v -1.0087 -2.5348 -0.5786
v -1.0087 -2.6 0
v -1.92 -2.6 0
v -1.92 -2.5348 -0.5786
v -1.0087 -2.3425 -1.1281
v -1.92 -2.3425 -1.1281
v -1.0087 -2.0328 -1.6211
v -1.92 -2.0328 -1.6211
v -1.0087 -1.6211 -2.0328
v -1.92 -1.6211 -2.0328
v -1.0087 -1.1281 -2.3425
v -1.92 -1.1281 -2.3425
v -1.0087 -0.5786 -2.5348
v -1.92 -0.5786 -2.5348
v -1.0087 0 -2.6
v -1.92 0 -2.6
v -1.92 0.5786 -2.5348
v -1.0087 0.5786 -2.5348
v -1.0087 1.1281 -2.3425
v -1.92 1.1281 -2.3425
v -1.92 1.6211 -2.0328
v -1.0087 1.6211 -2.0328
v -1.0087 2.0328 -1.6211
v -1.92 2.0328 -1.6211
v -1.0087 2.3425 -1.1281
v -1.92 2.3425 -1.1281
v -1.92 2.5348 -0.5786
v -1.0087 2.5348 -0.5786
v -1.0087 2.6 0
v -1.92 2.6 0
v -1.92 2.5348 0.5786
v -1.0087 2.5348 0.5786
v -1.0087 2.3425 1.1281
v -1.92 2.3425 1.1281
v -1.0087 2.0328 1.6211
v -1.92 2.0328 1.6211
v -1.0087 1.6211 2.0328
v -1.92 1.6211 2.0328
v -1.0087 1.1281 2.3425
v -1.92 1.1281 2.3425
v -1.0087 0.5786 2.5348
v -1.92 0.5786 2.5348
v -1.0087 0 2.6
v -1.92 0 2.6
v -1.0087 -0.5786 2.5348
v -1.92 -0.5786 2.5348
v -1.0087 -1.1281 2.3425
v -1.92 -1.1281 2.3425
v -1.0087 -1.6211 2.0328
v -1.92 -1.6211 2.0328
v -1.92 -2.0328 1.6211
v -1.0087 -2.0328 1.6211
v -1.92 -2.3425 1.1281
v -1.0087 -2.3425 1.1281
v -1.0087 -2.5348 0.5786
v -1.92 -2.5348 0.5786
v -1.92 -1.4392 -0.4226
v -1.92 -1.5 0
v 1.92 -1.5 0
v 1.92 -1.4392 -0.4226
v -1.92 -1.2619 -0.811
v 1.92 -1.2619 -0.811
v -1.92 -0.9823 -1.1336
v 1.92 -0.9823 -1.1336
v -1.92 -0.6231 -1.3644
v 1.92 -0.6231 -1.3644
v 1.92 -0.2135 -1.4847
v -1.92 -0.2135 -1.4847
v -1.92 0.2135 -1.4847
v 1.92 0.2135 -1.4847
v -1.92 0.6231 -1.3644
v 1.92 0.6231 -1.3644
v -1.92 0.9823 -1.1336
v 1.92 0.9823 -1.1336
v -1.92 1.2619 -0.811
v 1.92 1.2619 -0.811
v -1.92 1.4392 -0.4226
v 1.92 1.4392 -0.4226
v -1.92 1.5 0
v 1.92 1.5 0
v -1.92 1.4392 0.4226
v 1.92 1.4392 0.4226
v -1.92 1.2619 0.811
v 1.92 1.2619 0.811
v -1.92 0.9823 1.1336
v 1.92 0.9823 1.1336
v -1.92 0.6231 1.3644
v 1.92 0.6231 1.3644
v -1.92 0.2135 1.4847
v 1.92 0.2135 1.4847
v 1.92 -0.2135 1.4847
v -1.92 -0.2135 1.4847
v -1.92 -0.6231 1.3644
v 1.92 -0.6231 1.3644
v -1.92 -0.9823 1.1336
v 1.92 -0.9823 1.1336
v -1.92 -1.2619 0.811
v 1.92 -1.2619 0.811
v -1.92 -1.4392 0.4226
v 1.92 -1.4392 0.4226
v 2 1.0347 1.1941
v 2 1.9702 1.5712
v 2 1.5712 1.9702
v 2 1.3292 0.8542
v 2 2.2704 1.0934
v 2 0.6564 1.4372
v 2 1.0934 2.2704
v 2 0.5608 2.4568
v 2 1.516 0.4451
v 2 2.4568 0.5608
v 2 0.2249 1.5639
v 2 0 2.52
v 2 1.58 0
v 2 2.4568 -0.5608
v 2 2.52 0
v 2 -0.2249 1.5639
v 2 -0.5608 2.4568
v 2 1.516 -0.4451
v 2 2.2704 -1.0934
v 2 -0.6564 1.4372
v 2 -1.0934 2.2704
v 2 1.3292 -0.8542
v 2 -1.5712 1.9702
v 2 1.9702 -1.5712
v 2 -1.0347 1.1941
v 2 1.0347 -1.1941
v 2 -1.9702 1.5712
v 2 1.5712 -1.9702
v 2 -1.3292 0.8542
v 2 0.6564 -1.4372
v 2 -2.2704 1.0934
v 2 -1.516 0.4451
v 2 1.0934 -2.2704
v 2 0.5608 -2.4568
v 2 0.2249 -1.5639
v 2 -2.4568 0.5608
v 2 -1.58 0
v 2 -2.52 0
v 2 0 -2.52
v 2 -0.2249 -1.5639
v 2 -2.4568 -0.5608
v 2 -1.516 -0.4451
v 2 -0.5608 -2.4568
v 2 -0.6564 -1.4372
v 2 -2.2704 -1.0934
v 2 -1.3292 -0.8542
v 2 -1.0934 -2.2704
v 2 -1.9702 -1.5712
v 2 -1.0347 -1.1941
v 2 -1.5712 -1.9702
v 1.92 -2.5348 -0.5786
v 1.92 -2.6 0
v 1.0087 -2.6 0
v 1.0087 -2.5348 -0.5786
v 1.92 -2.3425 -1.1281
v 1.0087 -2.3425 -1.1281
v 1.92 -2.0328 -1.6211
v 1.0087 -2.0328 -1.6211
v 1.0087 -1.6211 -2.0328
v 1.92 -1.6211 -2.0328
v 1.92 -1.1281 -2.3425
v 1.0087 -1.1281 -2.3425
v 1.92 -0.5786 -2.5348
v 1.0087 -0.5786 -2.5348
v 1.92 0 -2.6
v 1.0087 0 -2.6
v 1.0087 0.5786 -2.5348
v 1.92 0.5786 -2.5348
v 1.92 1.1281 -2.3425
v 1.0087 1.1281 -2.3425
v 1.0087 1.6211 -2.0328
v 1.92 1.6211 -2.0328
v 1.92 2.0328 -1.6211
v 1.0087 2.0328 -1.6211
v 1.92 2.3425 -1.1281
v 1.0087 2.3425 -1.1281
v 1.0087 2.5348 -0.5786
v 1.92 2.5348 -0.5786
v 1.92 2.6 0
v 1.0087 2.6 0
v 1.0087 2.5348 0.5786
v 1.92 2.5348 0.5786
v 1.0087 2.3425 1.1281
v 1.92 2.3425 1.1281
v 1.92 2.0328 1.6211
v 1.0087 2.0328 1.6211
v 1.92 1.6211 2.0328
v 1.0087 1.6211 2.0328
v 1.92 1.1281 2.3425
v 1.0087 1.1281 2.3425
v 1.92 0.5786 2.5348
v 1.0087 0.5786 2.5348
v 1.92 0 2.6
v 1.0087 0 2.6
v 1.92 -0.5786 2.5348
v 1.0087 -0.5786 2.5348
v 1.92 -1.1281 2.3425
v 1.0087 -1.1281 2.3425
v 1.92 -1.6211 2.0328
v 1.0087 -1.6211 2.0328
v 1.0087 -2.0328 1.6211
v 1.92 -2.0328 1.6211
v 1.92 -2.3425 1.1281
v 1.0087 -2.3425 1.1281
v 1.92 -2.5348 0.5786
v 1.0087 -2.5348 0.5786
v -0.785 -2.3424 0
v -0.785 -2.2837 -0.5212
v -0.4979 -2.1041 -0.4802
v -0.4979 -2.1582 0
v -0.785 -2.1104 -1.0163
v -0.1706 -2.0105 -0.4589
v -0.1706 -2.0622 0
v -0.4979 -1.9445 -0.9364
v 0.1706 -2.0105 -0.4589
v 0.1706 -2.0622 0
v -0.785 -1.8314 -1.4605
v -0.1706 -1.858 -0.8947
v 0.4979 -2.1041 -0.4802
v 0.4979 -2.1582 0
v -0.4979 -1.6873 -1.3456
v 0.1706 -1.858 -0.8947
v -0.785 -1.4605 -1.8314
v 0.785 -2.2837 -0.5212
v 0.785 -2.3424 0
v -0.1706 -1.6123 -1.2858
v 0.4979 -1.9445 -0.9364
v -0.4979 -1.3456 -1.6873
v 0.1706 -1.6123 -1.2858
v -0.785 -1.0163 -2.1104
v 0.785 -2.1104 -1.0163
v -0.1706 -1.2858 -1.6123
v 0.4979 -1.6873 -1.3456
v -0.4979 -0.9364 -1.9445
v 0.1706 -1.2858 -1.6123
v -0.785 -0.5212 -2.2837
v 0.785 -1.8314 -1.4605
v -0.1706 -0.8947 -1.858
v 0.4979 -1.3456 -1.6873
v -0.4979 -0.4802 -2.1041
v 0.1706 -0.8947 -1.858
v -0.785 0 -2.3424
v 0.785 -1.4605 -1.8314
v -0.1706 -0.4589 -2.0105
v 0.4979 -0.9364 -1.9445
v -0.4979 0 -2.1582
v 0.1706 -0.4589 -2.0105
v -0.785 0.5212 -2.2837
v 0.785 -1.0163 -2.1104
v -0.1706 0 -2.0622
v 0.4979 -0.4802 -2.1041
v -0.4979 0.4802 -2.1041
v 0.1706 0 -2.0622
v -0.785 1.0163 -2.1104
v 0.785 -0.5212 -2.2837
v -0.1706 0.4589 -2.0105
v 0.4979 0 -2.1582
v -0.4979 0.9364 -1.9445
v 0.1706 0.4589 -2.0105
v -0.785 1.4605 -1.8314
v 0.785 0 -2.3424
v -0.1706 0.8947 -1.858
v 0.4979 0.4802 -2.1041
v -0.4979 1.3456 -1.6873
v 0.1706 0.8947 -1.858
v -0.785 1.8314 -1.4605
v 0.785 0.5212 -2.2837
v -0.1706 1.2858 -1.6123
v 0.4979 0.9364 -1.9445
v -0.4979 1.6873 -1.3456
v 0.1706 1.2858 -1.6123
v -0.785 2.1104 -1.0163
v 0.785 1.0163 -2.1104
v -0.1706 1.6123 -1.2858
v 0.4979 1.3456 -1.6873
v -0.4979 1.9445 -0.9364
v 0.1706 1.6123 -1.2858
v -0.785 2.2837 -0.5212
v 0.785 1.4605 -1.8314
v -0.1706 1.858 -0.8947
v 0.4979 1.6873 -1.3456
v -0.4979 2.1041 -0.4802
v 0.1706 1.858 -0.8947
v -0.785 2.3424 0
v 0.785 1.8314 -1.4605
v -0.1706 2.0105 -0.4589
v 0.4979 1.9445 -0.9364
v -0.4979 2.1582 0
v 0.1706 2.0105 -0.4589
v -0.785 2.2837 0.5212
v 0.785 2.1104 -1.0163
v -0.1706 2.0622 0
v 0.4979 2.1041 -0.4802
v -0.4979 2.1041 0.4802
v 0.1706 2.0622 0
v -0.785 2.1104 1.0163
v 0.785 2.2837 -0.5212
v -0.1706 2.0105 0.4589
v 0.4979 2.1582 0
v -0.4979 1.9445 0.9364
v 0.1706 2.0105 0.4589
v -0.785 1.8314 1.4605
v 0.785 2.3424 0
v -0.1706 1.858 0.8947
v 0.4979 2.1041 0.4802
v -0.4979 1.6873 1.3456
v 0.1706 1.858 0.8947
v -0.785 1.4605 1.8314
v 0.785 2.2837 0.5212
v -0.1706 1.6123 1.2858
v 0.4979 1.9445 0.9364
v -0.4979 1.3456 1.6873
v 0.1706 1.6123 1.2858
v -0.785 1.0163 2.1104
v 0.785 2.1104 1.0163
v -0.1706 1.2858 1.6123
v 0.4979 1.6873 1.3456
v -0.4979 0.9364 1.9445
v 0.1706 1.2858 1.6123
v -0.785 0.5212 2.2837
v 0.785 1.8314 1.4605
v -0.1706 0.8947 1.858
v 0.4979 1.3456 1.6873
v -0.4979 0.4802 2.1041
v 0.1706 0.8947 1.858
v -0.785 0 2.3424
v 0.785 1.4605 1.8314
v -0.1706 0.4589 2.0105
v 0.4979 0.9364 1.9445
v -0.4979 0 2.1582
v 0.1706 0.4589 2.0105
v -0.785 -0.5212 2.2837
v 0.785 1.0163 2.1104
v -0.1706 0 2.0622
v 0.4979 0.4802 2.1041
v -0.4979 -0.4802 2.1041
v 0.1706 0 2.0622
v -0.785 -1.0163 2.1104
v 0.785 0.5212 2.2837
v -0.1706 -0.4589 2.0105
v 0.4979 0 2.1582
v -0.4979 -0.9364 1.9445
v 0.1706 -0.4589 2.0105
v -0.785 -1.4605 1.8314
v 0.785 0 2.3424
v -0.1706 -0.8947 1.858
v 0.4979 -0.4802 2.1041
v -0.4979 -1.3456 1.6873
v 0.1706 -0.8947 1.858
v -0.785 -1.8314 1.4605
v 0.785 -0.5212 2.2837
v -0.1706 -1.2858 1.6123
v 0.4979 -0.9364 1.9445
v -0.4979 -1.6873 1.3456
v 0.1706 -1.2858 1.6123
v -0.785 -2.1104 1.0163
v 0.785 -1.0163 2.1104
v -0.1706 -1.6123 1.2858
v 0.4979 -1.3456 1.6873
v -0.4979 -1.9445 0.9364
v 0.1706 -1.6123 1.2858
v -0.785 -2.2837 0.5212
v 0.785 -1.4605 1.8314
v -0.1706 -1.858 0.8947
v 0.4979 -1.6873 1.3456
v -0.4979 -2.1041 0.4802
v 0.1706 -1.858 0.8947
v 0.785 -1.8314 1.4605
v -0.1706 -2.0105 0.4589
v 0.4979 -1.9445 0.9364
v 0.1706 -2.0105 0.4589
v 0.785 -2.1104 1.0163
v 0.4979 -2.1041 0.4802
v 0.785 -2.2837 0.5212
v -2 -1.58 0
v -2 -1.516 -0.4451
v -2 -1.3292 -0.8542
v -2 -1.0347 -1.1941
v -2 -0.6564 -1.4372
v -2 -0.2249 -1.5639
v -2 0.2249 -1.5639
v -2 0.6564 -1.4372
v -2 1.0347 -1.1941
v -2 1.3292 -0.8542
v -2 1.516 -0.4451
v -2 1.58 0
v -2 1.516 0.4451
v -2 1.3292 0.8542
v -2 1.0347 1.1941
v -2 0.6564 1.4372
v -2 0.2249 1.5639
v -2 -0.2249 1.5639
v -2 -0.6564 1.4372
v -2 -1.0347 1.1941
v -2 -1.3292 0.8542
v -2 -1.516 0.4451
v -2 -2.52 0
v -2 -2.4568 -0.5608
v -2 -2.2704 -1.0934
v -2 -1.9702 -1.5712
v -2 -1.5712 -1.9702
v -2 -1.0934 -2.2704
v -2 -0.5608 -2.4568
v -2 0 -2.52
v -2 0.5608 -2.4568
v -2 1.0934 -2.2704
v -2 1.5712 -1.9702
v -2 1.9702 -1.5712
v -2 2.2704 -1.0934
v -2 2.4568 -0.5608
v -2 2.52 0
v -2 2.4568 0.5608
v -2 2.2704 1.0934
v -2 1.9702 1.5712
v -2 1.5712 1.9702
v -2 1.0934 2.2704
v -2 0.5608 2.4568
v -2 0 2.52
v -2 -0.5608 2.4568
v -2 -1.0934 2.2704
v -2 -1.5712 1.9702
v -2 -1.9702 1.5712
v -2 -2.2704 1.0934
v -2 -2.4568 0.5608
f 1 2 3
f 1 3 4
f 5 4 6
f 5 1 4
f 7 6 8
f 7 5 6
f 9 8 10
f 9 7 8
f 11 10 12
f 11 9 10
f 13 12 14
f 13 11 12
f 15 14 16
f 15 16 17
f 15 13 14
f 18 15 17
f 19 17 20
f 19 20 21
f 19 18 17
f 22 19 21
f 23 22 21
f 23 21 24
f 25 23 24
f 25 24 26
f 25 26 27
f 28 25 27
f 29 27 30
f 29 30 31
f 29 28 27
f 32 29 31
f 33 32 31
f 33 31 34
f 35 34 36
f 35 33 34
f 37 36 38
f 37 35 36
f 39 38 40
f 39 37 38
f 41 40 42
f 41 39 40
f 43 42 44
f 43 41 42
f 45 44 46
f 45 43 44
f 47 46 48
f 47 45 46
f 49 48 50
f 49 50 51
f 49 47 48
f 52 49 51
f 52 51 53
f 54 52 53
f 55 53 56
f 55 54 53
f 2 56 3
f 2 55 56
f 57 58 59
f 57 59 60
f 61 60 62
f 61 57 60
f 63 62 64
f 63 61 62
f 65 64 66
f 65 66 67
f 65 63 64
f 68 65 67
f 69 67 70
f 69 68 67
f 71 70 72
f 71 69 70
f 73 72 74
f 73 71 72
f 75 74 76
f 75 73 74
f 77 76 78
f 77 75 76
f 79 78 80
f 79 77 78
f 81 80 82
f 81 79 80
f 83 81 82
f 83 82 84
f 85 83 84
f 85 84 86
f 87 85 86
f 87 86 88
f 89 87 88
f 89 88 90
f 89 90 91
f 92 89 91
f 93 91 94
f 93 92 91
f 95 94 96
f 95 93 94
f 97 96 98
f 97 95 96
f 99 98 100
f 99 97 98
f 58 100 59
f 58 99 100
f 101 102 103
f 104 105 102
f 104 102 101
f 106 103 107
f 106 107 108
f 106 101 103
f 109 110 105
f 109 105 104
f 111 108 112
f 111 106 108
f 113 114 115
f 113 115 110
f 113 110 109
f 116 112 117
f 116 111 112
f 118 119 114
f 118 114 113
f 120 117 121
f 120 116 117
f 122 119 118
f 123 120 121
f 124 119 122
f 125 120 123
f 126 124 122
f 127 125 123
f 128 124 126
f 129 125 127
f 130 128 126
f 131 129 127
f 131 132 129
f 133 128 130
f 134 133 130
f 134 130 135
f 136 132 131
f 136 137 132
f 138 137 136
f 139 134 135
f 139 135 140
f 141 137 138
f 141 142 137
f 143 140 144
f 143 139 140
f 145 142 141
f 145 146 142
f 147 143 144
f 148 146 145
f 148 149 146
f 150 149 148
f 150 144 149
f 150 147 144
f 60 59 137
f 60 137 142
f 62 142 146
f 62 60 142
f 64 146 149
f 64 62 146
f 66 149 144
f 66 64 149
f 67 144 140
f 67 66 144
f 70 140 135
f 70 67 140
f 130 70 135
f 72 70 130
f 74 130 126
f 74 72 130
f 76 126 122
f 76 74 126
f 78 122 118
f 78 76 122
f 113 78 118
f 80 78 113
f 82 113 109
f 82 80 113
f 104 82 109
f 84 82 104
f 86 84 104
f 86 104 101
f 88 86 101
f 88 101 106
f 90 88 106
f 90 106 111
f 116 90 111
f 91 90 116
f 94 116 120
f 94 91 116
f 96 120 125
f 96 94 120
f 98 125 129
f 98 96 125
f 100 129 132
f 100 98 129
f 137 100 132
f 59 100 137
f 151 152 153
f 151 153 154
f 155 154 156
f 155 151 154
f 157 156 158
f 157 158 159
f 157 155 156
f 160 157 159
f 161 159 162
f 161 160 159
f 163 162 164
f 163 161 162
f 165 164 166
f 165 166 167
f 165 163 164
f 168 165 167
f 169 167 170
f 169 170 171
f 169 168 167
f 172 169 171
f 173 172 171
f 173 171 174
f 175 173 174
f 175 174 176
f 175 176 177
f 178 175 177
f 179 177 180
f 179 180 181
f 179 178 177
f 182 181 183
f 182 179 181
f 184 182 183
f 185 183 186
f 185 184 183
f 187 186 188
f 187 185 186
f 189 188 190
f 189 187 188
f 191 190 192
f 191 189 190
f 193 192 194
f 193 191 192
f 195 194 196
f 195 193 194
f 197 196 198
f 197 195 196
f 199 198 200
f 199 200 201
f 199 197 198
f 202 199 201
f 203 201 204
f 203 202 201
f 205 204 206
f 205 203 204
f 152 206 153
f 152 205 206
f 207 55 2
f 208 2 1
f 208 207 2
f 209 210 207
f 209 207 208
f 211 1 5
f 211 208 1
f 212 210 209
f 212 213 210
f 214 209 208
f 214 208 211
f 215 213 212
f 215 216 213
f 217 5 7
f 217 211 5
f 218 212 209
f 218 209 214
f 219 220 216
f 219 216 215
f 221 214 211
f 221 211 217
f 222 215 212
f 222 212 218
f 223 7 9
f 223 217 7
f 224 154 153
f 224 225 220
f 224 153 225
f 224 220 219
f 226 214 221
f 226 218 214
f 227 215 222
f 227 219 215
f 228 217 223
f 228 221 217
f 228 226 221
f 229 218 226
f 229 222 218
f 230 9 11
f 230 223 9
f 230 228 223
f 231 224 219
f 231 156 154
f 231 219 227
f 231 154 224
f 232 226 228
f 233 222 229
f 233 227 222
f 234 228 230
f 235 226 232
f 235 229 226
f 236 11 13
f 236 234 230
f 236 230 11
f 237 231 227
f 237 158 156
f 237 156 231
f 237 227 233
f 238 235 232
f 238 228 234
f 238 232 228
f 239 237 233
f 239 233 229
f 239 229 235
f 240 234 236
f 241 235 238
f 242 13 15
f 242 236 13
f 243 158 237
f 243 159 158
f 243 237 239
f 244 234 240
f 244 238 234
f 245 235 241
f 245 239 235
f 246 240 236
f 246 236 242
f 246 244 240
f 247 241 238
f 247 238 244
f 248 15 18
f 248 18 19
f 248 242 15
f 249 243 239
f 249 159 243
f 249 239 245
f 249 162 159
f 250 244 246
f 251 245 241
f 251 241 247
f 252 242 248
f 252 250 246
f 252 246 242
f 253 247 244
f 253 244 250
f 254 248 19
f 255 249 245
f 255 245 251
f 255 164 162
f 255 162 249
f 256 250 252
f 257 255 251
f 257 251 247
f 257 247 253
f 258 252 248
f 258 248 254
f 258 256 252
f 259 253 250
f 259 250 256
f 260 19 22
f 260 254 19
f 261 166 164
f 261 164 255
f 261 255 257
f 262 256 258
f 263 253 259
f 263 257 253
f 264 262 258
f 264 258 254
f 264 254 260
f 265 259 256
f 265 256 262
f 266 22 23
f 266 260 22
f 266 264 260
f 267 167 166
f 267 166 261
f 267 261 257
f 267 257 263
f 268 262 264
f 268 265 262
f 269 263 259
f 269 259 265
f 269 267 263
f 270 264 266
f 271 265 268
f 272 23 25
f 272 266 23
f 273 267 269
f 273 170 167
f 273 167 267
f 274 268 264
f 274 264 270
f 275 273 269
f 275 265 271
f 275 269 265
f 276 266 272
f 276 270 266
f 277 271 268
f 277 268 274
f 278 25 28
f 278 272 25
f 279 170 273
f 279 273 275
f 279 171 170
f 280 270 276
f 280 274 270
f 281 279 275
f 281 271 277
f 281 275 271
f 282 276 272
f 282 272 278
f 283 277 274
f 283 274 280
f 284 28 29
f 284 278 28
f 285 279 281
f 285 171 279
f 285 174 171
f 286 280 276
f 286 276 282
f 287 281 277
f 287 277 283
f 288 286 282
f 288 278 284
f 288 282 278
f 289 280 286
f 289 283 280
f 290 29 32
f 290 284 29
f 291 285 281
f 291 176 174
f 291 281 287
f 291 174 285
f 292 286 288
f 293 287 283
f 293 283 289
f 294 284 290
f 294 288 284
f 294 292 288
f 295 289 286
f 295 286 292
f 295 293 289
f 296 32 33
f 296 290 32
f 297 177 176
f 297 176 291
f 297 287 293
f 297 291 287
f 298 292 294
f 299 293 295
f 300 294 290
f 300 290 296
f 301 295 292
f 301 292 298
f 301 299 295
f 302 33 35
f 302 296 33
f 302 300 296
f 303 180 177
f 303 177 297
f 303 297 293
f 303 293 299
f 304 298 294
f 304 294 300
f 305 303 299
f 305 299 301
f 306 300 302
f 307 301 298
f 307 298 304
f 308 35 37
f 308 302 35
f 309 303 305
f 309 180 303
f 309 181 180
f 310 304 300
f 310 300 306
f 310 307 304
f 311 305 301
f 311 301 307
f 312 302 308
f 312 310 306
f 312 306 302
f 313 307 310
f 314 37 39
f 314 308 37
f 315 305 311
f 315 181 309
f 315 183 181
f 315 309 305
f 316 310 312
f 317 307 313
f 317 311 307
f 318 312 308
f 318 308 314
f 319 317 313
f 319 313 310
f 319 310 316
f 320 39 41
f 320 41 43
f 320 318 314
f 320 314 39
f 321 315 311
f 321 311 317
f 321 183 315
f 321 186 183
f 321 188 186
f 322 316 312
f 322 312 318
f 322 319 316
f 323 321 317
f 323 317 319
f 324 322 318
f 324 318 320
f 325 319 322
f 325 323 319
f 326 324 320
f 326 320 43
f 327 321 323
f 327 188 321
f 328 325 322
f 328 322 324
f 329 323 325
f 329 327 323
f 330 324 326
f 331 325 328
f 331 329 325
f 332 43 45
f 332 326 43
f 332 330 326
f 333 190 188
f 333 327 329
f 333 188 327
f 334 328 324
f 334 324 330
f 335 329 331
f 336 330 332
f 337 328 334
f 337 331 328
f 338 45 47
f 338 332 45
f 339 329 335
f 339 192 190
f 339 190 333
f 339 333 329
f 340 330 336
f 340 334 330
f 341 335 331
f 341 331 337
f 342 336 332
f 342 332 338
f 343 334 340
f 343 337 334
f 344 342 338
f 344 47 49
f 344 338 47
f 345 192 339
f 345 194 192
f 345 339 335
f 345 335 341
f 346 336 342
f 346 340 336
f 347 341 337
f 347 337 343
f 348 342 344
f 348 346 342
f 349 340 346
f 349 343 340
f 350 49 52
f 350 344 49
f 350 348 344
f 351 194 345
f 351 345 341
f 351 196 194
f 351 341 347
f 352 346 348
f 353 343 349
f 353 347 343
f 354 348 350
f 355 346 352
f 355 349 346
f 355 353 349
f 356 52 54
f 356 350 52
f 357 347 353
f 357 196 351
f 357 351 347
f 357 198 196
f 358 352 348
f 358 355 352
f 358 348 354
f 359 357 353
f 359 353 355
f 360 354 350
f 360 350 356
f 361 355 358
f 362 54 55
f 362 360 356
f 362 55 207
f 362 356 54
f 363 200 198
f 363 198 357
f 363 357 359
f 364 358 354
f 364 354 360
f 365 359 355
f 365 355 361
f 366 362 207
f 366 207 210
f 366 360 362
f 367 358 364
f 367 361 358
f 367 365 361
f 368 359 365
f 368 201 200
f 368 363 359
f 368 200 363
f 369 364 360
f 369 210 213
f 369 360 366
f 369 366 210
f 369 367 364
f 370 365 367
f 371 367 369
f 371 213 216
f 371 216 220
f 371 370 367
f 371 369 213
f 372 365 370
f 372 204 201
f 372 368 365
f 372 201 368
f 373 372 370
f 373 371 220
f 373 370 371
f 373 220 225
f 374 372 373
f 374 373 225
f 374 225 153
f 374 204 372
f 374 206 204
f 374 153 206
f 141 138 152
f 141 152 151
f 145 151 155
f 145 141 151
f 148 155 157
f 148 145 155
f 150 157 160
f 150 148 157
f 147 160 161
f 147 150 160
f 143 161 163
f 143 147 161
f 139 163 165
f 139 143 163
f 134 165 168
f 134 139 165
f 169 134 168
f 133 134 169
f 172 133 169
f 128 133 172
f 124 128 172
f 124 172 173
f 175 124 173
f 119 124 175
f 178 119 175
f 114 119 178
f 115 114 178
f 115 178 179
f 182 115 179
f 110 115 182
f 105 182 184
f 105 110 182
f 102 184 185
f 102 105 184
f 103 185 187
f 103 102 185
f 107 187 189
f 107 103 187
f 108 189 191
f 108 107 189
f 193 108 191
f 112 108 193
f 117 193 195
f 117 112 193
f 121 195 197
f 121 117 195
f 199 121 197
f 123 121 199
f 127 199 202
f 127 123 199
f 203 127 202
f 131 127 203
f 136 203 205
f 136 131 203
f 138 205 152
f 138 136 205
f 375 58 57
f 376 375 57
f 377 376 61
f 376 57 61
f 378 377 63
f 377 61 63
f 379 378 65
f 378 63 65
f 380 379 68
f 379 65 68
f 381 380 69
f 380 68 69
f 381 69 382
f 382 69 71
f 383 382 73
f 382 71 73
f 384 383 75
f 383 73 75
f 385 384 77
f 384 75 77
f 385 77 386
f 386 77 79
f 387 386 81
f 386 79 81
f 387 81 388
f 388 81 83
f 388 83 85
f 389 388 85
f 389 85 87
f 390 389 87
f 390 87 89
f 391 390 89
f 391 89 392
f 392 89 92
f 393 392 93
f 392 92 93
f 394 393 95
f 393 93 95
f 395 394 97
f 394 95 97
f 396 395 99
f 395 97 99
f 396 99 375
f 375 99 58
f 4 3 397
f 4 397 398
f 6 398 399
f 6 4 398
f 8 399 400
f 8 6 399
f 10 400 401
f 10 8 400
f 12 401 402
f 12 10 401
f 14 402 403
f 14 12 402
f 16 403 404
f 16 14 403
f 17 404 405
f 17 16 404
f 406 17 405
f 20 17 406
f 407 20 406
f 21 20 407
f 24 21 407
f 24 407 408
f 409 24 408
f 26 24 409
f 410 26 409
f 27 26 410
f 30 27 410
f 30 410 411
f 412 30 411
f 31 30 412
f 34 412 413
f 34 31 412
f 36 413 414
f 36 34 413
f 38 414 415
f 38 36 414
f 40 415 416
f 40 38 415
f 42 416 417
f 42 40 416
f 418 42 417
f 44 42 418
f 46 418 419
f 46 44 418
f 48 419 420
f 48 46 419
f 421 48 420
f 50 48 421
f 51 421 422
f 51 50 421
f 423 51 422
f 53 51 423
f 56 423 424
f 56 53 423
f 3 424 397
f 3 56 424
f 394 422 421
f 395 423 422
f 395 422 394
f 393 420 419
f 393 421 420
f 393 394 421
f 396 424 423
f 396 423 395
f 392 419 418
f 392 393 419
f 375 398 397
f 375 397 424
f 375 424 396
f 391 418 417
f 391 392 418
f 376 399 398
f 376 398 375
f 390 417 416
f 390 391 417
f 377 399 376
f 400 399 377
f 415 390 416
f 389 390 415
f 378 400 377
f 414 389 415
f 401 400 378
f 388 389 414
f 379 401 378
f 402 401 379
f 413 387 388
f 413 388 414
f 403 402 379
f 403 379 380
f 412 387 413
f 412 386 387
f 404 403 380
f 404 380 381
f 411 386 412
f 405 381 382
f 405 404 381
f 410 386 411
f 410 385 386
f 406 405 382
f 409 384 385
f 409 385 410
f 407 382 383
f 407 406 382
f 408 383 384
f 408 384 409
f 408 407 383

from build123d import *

# Parameters (mm, degrees)
CHAMFER1_SIZE = 0.08


with BuildPart() as part:
    # Sketch1 → Revolve1 (revolve)
    with BuildSketch(Plane.XY):
        with BuildLine():
            Line((-2, -1.5), (-2, -2.6))
            Line((-2, -2.6), (-1.00871205, -2.6))
            ThreePointArc((-1.00871205, -2.6), (0, -2.05), (1.00871205, -2.6))
            Line((1.00871205, -2.6), (2, -2.6))
            Line((2, -2.6), (2, -1.5))
            Line((2, -1.5), (-2, -1.5))
        make_face()
    revolve(axis=Axis((-6.429017492, 0, 0), (1, 0, 0)))

    # Chamfer1
    chamfer1_edges = [part.edges().sort_by_distance(p)[0] for p in [
        (-2, 1.5, 0),
        (-2, 2.6, 0),
        (2, 2.6, 0),
        (2, 1.5, 0),
    ]]
    chamfer(chamfer1_edges, length=CHAMFER1_SIZE)


solid = part.part
